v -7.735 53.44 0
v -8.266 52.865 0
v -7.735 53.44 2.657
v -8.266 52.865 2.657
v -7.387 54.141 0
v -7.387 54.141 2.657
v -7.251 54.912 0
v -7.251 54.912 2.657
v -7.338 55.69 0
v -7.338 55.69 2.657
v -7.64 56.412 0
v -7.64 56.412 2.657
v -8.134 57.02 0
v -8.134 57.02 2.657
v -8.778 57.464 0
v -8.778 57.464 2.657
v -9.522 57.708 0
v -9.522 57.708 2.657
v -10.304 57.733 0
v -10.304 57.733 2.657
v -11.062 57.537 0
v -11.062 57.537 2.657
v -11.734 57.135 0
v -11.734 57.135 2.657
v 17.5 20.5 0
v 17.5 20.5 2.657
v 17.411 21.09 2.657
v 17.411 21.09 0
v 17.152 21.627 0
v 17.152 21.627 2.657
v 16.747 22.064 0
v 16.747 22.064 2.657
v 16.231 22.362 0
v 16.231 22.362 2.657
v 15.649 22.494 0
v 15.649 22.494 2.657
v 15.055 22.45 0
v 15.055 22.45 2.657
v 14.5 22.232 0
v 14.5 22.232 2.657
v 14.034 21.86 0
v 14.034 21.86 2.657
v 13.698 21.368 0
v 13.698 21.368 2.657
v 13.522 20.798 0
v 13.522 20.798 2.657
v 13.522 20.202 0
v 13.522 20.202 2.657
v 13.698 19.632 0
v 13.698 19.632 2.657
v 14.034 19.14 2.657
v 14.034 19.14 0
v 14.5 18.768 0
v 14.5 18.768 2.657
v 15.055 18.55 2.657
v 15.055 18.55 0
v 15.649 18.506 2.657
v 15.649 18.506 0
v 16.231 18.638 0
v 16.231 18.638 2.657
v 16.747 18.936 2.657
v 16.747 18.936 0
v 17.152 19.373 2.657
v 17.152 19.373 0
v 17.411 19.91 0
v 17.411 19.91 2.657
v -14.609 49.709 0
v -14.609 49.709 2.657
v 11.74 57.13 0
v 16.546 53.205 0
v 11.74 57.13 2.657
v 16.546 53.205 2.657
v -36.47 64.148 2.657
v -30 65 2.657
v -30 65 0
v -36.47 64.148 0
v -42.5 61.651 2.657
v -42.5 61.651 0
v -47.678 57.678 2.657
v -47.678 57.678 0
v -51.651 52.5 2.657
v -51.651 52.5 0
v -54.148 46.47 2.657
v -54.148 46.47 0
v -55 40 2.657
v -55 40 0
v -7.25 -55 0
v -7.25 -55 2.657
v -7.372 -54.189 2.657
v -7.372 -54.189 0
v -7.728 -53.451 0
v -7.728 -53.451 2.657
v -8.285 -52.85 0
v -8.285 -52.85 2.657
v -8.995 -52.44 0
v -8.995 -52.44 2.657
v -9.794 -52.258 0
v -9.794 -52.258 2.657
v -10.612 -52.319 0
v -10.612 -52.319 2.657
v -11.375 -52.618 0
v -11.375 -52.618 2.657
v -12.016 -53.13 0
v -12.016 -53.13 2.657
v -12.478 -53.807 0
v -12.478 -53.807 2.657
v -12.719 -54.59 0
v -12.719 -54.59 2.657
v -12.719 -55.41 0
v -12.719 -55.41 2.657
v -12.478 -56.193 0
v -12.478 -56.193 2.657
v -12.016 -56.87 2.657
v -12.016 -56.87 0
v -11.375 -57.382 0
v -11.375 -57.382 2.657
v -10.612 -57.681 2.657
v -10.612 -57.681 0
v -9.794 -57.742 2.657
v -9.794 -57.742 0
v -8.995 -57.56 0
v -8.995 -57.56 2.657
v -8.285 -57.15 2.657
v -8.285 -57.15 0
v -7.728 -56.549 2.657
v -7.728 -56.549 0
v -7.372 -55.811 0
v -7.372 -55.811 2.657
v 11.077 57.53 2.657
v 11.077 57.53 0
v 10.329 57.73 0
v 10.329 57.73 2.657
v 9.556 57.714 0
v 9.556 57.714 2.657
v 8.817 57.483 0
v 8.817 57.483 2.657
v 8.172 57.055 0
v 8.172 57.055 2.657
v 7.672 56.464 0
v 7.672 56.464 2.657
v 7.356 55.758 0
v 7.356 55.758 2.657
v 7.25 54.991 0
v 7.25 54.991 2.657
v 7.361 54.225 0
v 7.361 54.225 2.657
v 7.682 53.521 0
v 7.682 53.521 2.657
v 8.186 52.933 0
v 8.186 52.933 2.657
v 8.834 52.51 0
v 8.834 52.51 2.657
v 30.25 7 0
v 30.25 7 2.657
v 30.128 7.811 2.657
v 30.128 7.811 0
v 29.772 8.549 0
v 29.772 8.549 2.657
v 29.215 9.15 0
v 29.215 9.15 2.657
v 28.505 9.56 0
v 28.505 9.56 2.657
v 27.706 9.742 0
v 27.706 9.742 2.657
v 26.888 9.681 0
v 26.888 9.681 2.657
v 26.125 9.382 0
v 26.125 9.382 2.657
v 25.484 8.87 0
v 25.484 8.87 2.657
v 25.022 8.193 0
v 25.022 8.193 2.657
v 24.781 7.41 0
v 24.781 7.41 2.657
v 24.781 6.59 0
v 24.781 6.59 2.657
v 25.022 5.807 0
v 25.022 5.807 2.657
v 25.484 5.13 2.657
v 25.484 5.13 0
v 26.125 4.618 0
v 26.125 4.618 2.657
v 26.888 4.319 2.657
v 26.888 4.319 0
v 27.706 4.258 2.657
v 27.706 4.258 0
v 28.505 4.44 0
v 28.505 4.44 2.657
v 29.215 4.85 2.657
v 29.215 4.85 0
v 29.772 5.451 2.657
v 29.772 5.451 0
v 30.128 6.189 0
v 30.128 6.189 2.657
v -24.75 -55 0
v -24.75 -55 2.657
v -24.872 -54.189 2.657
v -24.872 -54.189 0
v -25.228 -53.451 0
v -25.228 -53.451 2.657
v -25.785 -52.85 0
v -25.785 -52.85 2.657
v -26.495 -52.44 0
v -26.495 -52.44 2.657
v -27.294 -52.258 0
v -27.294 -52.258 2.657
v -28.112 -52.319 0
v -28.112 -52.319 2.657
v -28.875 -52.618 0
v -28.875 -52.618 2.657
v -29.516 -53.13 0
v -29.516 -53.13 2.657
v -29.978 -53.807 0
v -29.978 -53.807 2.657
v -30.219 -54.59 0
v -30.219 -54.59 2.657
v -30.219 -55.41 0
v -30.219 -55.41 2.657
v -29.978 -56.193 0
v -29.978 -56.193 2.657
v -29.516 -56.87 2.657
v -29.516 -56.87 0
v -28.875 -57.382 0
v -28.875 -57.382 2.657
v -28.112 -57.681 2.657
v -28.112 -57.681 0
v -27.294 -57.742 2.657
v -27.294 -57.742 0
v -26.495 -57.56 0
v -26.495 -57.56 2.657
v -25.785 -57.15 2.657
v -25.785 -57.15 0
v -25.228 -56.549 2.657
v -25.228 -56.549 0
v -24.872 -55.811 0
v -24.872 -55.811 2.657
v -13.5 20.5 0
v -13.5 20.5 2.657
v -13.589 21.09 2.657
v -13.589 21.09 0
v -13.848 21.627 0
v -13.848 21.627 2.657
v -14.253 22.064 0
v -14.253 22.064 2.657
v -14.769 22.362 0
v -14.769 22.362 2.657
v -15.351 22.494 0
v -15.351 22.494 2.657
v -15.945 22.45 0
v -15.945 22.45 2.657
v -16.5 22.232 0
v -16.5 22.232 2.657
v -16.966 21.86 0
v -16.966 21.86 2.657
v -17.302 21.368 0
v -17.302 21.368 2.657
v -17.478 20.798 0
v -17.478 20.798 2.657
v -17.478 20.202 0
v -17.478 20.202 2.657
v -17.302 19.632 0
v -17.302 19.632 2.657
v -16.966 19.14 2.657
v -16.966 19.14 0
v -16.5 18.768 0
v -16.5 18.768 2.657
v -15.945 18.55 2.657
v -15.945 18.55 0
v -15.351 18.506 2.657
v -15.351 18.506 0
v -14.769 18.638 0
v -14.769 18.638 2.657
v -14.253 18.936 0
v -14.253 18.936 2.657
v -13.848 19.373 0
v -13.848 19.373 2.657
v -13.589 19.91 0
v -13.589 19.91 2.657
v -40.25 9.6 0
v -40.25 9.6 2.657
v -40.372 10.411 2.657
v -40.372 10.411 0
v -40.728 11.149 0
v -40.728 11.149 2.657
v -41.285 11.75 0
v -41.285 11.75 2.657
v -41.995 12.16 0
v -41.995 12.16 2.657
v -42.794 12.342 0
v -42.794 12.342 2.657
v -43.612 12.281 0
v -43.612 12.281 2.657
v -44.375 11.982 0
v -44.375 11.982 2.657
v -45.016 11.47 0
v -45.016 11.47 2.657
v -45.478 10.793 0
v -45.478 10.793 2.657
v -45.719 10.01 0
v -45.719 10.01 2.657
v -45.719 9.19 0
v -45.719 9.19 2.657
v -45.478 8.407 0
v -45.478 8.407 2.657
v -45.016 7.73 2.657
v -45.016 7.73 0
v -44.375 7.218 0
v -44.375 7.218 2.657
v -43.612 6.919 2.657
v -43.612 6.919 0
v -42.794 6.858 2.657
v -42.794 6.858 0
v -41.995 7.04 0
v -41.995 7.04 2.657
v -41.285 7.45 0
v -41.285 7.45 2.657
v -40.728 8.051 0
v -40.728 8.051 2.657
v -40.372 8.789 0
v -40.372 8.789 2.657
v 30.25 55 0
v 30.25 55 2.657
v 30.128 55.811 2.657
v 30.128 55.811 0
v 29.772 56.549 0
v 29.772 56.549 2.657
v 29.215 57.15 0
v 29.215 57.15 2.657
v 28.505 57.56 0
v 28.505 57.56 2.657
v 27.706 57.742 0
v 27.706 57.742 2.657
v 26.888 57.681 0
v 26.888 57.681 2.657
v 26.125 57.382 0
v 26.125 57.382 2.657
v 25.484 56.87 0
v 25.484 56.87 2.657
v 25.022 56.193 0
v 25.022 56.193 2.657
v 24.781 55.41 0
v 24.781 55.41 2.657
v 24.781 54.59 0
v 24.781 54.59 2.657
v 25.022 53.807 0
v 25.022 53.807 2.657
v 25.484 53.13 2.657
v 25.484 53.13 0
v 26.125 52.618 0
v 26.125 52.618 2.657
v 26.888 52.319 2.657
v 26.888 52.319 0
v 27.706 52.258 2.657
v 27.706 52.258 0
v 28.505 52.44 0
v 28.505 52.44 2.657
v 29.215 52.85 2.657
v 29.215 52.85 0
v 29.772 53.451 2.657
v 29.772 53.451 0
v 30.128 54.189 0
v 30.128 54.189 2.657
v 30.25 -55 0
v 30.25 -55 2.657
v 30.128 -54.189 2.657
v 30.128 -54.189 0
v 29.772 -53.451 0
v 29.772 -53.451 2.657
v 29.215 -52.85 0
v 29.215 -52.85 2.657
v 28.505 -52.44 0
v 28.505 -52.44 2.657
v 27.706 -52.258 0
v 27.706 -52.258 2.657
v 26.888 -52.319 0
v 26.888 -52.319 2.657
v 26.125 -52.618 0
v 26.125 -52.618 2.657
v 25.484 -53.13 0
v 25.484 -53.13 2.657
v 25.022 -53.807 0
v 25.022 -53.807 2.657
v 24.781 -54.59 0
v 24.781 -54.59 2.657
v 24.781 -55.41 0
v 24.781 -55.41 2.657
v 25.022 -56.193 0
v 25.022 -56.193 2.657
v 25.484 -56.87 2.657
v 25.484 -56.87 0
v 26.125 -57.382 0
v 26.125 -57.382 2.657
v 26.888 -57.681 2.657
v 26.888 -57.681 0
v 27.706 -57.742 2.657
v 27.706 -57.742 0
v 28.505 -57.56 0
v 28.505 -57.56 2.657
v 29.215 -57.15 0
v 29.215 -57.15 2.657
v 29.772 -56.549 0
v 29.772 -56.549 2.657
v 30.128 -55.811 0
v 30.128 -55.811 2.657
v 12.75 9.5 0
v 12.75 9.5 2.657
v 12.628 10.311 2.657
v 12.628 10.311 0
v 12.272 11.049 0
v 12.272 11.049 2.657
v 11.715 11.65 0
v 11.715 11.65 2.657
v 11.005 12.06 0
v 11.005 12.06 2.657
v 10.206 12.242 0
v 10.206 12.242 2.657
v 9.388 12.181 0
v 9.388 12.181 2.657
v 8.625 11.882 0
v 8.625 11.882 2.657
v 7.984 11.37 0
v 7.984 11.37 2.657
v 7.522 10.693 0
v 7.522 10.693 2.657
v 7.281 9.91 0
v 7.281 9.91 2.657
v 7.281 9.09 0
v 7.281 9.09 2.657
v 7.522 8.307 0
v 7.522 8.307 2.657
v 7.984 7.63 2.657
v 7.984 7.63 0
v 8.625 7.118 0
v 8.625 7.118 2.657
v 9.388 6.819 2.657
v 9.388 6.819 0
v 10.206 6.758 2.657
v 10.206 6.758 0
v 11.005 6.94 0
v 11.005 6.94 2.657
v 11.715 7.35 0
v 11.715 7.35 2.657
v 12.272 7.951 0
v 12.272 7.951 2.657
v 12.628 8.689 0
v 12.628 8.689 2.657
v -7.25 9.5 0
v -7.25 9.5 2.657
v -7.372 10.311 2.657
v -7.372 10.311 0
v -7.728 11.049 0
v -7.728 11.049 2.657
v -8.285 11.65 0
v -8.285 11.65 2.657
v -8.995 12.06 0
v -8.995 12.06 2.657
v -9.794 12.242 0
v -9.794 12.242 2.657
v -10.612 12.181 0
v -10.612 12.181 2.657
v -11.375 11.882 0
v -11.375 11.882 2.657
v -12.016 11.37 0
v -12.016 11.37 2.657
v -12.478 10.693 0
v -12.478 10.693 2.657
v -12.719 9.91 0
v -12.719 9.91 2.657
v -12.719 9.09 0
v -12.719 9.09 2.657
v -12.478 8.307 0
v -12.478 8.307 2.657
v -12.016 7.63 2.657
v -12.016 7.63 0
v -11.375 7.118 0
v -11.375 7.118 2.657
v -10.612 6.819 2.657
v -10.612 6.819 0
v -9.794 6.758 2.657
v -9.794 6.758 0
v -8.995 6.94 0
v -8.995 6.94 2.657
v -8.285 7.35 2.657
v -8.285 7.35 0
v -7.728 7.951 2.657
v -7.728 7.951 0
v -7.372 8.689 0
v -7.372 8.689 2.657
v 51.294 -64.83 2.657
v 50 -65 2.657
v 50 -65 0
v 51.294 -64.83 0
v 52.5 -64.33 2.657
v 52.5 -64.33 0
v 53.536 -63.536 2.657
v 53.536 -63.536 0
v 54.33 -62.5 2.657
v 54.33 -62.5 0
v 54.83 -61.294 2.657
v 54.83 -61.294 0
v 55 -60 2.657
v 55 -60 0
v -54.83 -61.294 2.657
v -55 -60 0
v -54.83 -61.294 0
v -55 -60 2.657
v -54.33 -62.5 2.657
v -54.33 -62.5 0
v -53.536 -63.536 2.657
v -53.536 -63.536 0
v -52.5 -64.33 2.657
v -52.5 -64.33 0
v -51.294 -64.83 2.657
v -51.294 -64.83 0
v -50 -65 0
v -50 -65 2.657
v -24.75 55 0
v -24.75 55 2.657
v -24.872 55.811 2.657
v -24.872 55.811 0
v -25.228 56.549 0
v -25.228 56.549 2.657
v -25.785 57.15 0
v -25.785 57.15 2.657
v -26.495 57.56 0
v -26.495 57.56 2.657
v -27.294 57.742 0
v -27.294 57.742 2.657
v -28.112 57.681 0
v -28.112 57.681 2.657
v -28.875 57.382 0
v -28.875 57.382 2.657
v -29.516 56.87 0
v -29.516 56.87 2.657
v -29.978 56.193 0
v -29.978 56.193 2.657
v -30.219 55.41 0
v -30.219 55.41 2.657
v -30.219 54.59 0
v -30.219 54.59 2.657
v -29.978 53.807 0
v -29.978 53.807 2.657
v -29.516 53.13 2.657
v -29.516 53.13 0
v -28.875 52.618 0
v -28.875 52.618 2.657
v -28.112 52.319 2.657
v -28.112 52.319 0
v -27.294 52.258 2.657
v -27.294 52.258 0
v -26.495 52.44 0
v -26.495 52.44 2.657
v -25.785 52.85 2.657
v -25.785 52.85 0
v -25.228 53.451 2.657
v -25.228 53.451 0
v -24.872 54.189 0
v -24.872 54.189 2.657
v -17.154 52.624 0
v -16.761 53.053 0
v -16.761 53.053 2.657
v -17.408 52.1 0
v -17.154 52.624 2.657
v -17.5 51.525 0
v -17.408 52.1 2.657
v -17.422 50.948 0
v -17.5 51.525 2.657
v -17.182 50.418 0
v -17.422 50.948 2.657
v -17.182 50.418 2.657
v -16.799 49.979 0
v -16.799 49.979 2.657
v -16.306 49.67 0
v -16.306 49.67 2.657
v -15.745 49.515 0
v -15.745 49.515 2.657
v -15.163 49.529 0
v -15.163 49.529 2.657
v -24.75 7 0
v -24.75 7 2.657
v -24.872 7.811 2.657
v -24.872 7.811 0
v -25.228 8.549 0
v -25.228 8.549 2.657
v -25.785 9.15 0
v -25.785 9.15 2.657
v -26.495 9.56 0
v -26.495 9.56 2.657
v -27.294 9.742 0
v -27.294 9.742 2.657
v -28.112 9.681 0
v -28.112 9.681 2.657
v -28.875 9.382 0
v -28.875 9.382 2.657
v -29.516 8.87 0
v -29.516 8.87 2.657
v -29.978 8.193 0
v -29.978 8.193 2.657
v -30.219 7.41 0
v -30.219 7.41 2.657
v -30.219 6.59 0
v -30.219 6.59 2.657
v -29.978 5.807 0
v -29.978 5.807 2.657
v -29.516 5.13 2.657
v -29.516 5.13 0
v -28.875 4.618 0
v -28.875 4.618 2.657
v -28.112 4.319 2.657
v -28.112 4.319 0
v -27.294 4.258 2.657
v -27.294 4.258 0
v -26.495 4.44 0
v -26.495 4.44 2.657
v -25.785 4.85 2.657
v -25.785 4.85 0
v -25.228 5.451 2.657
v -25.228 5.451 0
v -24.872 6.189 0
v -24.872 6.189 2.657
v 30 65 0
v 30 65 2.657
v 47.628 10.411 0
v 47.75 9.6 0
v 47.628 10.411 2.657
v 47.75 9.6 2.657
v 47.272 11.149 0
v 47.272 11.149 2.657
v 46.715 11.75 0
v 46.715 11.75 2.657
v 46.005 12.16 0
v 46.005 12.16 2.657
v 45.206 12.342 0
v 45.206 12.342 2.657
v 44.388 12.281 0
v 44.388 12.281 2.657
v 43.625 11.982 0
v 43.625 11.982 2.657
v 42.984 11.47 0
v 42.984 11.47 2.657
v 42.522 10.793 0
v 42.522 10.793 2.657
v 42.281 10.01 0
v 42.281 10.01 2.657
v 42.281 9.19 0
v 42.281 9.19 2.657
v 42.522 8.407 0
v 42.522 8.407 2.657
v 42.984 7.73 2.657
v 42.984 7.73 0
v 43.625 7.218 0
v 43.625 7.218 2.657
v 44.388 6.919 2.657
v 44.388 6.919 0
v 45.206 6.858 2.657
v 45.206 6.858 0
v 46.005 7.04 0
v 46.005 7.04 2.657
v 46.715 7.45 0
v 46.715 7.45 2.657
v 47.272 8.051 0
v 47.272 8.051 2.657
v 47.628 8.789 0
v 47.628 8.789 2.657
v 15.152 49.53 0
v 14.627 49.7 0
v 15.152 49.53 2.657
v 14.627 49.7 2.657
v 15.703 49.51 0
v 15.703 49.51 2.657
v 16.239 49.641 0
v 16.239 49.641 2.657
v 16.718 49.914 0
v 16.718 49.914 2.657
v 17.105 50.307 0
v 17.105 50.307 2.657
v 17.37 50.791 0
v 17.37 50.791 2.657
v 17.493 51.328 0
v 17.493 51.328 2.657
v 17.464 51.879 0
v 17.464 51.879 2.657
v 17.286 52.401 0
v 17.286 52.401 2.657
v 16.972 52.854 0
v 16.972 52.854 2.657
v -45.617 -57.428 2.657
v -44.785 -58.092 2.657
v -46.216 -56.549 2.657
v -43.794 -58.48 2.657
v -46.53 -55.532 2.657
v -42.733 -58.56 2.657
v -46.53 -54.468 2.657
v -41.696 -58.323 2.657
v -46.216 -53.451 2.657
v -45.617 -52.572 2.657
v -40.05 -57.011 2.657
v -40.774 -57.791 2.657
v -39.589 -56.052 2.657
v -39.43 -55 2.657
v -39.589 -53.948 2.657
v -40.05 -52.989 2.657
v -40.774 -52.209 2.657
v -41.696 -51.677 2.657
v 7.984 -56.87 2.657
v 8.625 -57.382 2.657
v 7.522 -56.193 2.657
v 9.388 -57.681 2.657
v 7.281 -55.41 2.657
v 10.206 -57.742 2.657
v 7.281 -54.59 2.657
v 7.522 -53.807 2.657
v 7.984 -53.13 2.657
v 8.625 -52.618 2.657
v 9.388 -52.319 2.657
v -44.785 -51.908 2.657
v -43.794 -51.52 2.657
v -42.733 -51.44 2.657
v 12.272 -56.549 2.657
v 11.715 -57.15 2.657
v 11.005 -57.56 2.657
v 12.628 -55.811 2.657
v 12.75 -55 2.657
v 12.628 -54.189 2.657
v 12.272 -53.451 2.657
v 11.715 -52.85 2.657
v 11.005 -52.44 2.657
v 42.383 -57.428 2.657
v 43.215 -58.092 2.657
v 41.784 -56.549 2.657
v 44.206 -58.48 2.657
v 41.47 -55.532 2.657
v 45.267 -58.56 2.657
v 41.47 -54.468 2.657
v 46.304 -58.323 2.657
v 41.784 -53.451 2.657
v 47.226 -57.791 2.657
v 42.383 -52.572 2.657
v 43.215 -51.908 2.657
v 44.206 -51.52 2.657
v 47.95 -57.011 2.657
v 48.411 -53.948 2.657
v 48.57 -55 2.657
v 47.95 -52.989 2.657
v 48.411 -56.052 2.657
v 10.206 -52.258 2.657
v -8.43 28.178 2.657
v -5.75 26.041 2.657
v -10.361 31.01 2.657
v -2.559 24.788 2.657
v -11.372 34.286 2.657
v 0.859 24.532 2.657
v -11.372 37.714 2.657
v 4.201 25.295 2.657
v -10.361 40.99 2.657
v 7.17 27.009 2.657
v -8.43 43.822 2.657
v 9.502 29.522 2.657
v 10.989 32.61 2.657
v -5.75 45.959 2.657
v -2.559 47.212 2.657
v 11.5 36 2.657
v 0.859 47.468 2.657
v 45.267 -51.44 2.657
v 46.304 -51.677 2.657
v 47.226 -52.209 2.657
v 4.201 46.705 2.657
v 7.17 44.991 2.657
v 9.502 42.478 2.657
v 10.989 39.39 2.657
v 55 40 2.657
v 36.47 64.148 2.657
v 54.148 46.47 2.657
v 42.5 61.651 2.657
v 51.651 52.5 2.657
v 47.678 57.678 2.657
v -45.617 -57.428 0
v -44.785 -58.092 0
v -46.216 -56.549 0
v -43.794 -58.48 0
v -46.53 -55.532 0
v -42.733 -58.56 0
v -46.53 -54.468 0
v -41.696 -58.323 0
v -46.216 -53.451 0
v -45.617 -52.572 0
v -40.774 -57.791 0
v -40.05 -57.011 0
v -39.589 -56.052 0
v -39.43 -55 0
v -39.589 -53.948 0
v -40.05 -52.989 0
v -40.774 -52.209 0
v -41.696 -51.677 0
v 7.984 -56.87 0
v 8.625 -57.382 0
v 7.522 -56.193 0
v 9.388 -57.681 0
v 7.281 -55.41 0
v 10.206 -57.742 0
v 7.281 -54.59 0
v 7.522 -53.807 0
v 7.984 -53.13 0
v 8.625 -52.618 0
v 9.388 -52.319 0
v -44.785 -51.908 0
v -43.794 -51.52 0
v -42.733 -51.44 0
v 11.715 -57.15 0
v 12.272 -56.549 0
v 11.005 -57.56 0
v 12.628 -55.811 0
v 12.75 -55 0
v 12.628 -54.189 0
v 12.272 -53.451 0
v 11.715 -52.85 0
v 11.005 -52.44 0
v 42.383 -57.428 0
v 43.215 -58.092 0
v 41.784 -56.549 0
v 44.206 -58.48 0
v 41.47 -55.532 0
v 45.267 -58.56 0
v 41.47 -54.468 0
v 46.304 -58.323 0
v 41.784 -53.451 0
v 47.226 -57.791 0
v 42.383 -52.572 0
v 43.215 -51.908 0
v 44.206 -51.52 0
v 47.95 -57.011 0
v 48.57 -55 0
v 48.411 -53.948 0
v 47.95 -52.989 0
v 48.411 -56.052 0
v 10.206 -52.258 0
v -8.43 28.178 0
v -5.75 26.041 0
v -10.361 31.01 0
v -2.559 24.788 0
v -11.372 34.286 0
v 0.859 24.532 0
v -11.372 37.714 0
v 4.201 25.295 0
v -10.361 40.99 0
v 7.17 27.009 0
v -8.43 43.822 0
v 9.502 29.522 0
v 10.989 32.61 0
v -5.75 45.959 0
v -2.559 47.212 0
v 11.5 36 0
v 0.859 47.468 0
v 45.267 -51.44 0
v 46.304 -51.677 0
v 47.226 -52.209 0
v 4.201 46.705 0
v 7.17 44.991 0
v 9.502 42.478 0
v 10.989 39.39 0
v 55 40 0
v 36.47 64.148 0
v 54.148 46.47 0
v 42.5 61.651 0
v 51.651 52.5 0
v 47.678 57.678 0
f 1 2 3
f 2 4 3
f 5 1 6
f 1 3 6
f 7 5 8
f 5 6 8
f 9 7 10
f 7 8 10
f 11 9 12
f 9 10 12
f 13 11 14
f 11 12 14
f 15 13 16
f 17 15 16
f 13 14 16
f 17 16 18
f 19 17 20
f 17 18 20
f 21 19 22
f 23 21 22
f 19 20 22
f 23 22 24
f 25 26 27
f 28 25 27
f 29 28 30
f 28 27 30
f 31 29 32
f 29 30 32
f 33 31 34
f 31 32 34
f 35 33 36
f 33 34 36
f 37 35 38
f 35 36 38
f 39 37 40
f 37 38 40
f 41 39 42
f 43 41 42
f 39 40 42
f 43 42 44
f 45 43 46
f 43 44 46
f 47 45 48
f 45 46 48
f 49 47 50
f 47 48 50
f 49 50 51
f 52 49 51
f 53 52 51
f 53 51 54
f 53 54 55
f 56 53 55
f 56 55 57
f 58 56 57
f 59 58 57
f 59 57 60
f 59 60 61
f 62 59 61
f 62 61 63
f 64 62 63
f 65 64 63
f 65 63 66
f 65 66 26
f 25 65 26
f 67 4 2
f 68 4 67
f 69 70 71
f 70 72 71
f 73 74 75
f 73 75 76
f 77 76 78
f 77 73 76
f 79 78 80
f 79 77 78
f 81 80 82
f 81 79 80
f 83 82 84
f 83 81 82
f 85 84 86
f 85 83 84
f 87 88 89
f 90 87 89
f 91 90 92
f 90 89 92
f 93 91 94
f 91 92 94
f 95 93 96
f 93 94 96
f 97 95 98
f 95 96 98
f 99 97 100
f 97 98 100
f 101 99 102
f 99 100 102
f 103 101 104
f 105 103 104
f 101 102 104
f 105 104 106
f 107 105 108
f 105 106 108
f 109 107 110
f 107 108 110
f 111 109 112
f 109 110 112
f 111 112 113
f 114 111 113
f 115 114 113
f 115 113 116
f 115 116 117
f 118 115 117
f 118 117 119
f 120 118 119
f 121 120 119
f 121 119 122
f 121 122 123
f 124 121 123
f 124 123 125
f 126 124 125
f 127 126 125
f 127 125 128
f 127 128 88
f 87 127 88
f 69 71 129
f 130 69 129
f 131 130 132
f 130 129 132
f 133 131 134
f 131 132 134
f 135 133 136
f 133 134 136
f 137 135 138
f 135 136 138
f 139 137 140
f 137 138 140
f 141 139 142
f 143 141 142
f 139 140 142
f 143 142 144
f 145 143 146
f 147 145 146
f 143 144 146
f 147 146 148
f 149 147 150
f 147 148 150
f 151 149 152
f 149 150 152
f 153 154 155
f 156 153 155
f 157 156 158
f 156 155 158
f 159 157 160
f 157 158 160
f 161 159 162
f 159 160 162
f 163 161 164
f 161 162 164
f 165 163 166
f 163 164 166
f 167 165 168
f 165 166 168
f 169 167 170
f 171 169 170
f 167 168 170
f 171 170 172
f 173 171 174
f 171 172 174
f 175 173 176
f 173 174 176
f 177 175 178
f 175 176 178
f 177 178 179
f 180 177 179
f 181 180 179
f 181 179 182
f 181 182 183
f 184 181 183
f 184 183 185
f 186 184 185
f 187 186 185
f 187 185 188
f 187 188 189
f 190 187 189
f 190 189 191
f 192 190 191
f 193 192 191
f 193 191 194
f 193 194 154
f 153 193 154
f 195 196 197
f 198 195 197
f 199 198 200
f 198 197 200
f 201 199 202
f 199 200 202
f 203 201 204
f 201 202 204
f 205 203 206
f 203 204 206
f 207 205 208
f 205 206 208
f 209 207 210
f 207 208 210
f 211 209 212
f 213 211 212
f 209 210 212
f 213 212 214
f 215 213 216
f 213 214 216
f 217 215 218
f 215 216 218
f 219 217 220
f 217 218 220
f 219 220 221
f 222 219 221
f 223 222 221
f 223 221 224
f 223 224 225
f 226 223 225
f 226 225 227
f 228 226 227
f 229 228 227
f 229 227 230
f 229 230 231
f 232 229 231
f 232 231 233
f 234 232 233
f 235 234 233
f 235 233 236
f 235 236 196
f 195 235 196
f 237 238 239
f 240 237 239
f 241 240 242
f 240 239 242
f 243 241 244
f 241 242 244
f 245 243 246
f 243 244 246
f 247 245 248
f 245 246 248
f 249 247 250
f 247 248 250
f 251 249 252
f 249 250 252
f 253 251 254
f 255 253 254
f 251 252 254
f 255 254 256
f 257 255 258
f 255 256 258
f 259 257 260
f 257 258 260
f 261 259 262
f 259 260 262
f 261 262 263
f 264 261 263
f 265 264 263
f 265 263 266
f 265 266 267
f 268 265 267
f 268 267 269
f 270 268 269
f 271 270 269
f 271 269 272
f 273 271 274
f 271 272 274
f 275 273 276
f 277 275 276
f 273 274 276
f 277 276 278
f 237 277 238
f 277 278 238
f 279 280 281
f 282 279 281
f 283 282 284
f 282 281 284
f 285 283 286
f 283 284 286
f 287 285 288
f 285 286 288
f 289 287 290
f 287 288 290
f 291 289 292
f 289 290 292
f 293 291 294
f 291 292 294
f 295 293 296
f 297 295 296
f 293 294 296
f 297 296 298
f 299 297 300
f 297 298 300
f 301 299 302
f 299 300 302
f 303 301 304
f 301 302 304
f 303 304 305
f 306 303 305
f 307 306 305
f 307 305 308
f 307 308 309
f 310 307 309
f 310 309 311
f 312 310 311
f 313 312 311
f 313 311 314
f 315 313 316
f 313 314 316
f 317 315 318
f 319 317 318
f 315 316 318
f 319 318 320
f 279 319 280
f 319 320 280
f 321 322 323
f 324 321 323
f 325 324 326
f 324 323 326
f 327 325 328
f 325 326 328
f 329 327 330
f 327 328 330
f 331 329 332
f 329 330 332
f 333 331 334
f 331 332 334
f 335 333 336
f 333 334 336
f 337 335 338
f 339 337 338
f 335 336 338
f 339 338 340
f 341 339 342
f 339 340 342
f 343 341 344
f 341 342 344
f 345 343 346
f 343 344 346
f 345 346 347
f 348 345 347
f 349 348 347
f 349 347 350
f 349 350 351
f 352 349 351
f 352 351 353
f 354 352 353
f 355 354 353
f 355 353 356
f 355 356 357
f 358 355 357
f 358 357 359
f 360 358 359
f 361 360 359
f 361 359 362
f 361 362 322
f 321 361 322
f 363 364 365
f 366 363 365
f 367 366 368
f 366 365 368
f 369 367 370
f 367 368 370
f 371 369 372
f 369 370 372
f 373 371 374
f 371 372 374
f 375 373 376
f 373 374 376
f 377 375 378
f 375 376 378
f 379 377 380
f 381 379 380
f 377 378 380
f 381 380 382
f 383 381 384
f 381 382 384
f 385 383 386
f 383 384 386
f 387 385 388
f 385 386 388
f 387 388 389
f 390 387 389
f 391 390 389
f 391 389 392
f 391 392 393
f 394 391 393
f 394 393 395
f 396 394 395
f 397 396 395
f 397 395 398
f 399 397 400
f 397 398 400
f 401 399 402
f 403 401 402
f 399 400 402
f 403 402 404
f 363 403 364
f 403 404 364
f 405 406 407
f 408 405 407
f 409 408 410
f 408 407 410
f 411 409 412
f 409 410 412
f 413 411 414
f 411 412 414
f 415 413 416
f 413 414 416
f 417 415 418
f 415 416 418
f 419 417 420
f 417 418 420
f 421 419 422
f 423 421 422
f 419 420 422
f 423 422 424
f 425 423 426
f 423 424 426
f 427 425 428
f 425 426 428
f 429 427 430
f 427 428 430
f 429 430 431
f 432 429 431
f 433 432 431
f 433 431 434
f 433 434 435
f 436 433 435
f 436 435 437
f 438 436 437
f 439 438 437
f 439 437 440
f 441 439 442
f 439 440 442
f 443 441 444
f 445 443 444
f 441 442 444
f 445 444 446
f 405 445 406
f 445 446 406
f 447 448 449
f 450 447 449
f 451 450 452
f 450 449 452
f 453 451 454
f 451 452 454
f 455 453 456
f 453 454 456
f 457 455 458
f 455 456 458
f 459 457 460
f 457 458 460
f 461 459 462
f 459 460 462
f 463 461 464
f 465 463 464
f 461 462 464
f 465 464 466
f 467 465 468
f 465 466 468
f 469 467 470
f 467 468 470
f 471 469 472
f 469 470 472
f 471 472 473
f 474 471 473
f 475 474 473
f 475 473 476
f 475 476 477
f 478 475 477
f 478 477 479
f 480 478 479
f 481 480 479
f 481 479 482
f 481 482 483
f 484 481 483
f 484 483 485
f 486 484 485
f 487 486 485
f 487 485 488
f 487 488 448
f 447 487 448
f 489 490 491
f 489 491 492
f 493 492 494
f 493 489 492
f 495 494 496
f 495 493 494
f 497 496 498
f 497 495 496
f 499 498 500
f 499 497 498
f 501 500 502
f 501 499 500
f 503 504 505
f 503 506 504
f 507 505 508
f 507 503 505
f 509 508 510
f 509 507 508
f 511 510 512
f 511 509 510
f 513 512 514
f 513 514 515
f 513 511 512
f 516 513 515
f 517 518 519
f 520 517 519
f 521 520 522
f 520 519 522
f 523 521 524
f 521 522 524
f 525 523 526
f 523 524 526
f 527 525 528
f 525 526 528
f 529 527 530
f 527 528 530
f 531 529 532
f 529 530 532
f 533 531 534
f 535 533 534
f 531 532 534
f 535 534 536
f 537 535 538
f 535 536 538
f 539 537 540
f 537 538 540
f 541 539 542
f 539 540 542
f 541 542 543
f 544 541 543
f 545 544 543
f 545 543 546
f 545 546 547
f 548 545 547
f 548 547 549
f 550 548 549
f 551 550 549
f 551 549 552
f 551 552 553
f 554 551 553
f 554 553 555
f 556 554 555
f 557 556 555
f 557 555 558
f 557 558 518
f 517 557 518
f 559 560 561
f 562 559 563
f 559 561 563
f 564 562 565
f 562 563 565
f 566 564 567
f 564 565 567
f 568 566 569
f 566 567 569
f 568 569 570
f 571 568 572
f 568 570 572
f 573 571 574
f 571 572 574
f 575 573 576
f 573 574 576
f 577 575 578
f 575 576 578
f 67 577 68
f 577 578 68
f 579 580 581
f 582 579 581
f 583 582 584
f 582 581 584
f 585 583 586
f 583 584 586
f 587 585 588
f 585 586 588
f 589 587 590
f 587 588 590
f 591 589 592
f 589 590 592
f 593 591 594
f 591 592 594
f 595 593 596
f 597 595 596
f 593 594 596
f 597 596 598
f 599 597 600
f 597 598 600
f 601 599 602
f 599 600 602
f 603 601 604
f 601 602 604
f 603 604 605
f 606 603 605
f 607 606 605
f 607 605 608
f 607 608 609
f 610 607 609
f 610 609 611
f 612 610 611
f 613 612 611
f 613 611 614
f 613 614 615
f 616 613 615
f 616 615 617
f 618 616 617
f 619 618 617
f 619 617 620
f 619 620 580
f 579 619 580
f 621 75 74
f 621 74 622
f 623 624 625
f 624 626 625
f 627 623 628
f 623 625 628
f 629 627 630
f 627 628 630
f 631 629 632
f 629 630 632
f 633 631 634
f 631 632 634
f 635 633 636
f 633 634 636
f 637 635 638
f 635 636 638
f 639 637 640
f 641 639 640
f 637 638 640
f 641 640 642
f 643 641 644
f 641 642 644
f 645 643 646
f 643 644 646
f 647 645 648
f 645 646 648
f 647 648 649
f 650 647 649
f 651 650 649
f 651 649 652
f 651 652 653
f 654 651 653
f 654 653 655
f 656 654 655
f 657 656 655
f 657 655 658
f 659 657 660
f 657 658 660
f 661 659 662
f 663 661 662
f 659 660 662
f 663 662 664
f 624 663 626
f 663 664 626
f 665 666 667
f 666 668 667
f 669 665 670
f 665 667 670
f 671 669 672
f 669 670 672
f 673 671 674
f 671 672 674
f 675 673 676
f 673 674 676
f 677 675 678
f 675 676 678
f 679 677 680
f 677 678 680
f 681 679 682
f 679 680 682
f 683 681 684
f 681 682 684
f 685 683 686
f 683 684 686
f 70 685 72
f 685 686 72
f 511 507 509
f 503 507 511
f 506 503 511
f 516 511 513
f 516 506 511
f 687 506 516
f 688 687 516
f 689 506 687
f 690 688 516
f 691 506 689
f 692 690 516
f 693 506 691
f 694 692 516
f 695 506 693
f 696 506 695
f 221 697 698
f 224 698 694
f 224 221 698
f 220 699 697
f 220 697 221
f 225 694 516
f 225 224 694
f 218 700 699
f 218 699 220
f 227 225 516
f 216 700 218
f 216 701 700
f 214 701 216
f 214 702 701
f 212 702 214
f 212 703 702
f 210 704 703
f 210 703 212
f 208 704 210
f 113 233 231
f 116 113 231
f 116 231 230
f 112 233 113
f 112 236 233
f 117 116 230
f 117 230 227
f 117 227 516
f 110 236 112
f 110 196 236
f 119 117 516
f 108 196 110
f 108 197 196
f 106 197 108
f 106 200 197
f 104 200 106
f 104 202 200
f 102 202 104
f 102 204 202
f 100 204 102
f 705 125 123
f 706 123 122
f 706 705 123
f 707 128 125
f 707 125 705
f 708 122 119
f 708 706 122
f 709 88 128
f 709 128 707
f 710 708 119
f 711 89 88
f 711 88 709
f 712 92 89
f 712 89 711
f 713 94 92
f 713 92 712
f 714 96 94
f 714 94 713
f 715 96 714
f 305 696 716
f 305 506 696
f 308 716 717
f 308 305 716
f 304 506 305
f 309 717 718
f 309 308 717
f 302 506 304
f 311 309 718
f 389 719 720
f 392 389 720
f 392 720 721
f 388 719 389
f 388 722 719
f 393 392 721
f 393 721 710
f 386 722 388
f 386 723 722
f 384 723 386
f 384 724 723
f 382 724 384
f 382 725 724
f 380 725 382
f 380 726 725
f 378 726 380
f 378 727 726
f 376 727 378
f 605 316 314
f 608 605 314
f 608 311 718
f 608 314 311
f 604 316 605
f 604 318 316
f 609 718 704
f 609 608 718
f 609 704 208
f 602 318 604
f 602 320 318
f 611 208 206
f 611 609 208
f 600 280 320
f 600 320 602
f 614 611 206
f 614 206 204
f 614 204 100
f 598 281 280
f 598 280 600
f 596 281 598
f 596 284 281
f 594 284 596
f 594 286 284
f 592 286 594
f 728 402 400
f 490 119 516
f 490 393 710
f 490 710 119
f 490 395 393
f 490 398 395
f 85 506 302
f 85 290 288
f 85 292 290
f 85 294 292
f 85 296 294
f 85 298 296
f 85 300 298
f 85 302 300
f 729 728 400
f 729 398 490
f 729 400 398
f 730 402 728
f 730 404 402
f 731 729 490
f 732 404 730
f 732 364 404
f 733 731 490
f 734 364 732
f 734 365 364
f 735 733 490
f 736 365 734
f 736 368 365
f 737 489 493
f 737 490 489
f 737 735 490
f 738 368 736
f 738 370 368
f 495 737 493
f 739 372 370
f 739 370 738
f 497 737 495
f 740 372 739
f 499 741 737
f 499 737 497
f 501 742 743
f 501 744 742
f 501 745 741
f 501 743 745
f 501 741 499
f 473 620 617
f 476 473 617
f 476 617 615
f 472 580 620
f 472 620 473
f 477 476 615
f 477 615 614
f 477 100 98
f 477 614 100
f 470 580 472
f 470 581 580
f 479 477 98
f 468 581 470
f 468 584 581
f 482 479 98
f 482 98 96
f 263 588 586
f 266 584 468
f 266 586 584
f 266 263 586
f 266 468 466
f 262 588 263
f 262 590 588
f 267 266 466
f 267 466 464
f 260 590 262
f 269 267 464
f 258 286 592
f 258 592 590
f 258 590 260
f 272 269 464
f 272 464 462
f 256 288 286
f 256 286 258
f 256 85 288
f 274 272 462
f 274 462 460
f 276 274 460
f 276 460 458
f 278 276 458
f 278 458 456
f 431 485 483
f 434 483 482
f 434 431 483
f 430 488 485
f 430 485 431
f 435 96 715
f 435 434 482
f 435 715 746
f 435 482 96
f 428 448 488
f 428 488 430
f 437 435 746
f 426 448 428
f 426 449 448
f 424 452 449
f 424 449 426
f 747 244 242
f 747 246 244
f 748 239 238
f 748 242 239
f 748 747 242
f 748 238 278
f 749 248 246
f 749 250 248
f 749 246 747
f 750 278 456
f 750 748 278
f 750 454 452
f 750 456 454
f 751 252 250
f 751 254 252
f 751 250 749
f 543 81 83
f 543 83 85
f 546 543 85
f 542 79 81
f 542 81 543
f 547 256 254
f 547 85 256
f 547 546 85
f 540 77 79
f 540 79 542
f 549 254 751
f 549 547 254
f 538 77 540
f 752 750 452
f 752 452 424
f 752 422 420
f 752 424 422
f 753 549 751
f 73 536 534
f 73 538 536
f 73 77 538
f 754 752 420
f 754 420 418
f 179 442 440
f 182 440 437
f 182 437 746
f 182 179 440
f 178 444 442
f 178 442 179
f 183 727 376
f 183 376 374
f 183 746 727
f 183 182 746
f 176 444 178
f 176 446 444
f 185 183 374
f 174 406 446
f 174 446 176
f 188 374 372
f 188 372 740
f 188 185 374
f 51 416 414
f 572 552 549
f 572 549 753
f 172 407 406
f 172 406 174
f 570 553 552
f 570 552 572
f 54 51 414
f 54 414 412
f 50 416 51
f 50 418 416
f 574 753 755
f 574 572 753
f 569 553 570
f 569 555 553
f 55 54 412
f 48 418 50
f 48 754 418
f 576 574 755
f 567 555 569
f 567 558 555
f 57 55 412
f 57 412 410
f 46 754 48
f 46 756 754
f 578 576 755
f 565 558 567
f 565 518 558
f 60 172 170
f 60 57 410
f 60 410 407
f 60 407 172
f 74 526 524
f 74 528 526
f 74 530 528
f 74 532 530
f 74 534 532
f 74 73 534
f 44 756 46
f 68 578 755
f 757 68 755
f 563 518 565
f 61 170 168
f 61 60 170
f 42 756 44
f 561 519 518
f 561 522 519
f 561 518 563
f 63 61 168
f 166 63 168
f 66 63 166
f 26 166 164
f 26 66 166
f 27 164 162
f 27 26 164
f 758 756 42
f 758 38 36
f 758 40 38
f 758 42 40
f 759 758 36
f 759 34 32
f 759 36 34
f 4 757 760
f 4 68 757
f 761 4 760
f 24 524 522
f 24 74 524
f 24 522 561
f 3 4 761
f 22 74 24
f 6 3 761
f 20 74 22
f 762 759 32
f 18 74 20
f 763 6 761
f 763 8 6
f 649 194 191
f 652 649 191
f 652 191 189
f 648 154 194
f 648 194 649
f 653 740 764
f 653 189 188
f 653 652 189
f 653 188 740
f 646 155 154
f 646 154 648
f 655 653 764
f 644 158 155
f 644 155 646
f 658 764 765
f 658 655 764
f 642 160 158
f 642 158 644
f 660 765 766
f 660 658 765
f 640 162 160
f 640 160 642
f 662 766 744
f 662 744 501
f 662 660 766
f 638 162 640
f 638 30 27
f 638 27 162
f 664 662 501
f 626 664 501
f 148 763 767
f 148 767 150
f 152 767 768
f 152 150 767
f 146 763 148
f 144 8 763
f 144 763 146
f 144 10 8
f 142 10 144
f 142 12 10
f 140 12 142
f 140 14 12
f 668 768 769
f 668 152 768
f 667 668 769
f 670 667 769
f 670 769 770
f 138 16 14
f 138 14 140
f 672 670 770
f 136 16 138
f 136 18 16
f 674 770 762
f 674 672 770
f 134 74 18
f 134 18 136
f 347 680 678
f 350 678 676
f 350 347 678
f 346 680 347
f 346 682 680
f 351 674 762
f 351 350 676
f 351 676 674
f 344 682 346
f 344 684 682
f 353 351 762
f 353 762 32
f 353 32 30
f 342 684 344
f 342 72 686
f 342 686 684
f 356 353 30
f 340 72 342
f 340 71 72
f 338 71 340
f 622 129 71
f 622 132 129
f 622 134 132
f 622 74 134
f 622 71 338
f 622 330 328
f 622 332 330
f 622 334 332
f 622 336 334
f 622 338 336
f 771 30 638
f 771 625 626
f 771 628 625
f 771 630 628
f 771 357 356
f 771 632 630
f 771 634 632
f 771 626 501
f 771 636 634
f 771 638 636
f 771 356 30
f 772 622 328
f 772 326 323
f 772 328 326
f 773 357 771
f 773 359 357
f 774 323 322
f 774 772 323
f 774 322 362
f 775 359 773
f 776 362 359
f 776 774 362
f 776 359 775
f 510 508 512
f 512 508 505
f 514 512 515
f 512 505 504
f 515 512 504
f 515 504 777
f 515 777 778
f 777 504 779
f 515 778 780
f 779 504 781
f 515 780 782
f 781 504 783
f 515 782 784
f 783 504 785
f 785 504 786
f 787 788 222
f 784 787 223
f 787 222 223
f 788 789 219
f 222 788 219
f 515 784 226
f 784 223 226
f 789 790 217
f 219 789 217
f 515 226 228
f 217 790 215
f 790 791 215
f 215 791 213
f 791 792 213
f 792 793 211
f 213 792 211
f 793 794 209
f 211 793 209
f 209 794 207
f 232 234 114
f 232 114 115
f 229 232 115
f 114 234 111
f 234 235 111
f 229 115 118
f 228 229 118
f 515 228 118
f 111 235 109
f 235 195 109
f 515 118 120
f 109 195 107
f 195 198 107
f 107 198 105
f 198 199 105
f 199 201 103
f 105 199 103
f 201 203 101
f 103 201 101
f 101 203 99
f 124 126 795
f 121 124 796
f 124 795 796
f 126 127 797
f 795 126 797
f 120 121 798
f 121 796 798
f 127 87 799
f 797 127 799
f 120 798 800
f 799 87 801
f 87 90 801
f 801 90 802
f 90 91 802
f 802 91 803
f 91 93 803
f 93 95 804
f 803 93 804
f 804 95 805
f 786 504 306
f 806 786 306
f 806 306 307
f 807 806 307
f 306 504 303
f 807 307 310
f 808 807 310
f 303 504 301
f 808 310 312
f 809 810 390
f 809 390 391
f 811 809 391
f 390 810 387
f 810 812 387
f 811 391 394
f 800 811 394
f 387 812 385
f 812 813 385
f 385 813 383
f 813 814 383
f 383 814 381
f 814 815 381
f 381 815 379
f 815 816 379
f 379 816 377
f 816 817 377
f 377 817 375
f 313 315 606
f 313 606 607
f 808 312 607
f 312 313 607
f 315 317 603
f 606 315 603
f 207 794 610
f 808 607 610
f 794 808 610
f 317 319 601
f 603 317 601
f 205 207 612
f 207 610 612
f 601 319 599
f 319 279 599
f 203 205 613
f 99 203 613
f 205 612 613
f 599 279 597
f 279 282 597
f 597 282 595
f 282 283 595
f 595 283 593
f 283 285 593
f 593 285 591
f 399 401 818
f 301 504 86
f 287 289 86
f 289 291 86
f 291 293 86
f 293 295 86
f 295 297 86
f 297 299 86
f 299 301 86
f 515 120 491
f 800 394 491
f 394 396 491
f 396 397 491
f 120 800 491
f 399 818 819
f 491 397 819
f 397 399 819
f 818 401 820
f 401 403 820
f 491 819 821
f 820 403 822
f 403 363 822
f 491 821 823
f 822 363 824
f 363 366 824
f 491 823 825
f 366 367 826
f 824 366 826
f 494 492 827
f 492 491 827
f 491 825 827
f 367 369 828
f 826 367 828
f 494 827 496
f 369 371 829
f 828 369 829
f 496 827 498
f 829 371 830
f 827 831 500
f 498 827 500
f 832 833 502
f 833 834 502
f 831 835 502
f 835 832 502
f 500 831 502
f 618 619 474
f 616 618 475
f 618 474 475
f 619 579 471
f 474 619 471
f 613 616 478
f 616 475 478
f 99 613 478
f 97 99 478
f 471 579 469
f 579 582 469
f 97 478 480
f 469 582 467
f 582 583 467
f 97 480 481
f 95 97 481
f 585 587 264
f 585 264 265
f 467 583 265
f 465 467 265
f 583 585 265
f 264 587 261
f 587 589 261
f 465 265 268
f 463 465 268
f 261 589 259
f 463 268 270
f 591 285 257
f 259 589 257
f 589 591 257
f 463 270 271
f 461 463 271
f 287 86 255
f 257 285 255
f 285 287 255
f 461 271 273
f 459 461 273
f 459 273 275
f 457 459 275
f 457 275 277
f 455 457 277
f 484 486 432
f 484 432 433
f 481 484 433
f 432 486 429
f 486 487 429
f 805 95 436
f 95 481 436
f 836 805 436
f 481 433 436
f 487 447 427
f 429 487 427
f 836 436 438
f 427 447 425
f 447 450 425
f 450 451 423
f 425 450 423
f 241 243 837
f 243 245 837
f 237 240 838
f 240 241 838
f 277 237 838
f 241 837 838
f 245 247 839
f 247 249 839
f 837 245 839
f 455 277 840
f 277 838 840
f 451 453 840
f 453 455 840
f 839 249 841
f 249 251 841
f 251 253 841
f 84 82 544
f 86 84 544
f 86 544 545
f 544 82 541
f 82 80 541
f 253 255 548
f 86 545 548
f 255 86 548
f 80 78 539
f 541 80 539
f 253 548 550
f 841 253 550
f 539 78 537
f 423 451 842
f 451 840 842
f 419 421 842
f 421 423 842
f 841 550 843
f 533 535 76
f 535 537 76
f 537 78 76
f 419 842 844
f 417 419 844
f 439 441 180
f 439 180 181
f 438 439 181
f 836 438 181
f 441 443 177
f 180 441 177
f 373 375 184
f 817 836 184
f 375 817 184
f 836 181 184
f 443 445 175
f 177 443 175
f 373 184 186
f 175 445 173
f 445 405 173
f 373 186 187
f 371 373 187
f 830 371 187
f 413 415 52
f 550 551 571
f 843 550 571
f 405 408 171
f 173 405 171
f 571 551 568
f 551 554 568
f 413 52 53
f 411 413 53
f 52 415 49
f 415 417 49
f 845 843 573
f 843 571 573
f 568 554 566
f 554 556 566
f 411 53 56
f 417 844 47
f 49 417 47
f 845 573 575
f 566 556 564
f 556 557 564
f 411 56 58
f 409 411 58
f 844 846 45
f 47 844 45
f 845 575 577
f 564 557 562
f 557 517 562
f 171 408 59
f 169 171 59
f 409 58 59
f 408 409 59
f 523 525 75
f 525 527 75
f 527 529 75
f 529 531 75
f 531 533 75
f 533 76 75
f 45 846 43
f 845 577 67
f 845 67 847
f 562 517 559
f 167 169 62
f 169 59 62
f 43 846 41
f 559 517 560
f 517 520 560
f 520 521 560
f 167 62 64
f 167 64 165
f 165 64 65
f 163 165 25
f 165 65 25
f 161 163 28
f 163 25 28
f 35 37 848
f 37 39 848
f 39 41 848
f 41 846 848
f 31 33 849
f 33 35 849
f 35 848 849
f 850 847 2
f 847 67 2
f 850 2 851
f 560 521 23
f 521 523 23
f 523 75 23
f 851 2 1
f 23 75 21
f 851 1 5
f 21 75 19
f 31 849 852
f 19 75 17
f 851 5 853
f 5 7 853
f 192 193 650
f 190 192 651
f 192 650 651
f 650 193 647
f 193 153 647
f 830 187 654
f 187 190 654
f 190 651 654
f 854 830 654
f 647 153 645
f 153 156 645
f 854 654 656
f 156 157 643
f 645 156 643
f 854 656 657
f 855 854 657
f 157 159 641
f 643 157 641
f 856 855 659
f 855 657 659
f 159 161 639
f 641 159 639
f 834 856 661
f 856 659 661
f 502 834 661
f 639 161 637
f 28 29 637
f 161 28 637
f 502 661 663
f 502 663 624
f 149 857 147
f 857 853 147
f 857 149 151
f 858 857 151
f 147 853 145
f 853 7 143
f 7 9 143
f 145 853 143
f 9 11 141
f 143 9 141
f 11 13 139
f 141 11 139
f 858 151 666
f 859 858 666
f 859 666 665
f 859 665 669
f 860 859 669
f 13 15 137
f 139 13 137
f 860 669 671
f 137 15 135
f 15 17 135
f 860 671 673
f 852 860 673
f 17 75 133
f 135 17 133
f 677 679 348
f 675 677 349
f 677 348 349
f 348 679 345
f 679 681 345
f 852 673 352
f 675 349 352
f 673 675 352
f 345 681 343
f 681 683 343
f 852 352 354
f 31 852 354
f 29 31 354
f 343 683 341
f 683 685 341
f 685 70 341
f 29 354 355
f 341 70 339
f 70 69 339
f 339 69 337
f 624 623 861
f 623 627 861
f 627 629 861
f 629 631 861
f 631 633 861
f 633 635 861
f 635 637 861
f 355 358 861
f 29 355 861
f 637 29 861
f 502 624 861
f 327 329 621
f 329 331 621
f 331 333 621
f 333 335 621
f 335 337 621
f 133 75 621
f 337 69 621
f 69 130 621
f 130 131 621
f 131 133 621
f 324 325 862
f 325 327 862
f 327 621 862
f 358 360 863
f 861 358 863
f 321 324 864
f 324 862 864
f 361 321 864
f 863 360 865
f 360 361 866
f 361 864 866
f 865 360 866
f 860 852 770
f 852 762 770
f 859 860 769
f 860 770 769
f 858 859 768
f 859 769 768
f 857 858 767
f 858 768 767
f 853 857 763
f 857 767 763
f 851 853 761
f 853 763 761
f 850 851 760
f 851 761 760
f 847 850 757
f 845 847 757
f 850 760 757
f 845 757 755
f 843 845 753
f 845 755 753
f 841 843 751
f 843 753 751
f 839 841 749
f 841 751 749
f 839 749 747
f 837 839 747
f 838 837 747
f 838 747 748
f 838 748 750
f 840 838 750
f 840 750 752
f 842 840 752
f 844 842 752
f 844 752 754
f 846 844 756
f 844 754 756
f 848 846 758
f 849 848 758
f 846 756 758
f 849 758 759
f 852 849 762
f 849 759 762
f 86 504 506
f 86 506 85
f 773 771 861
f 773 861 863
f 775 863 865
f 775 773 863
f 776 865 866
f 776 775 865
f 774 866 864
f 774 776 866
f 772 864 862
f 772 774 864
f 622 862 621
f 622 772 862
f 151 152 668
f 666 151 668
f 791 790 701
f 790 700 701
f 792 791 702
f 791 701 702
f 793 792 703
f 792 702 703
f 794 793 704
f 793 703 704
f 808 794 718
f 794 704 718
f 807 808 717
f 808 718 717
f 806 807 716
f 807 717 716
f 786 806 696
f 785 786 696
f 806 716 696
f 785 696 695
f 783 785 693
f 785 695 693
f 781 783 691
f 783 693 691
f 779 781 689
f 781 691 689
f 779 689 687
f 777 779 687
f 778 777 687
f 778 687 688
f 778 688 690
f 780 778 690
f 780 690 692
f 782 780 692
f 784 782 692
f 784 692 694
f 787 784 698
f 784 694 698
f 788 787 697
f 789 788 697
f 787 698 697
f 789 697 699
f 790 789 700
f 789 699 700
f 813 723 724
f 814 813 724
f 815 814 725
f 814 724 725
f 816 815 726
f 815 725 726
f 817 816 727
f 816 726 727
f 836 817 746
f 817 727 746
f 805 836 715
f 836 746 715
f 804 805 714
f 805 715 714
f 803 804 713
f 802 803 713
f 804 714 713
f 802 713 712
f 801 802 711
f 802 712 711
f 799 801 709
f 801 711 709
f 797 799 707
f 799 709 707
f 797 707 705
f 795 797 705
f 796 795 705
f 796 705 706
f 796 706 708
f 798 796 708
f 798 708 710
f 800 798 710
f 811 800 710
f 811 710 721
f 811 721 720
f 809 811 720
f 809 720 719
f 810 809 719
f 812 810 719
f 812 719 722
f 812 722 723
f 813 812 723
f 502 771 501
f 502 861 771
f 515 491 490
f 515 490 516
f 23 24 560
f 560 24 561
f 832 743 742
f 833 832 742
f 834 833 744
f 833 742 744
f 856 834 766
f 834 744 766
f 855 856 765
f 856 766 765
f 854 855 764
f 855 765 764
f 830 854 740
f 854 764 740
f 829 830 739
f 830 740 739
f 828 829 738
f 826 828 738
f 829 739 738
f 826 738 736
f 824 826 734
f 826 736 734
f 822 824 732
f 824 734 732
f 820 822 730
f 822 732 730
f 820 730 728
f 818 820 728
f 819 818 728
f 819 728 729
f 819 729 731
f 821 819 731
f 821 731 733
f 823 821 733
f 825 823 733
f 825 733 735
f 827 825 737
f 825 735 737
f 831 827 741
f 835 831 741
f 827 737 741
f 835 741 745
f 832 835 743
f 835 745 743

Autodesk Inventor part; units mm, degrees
ref_plane "YZ Plane" through (0, 0, 0) normal (1, 0, 0) x (0, 1, 0)
ref_plane "XZ Plane" through (0, 0, 0) normal (0, 1, 0) x (-1, 0, 0)
ref_plane "XY Plane" through (0, 0, 0) normal (0, 0, 1) x (1, 0, 0)
sketch "Sketch1" plane through (0, 0, 0) normal (0, 0, 1) x (1, 0, 0)
  line L0 (-55, 65) -> (55, 65)
  line L1 (55, 65) -> (55, -65)
  line L2 (55, -65) -> (-55, -65)
  line L3 (-55, -65) -> (-55, 65)
  point P0 (0, 0)
  dimension "d0" = 110
  dimension "d1" = 130
  dimension "d2" = 65
  dimension "d3" = 55
extrude "profile" add sketch "Sketch1" along normal blind 2.6568
sketch "Sketch3" plane through (0, 0, 2.6568) normal (0, 0, 1) x (1, 0, 0)
  line L0 (-55, 65) -> (-55, -65) projected
  line L1 (-55, -65) -> (55, -65) projected
  circle A0 centre (-43, -55) radius 3.57
  circle A1 centre (-43, 9.6) radius 2.75
  circle A2 centre (-43, 9.6) radius 11.75 construction
  point P0 (0, 0)
  dimension "d15" = 7.14
  dimension "d16" = 5.5
  dimension "d17" = 64.6
  dimension "d18" = 10
  dimension "d19" = 12
  dimension "d21" = 12
extrude "Extrusion3" cut sketch "Sketch3" against normal through all
pattern_linear "Rectangular Pattern2" count 2 spacing 88 along (1, 0, 0) of "Extrusion3"
sketch "Sketch4" plane through (0, 0, 2.6568) normal (0, 0, 1) x (1, 0, 0)
  line L0 (55, 65) -> (-55, 65) projected
  line L1 (55, -65) -> (55, 65) projected
  circle A0 centre (0, 36) radius 11.5
  circle A1 centre (-15.5, 51.5) radius 2
  circle A2 centre (15.5, 51.5) radius 2
  circle A3 centre (-15.5, 20.5) radius 2
  circle A4 centre (15.5, 20.5) radius 2
  point P0 (0, 0)
  dimension "d27" = 23
  dimension "d28" = 29
  dimension "d29" = 4
  dimension "d30" = 15.5
  dimension "d31" = 15.5
  dimension "d36" = 55
  dimension "d51" = 31
  dimension "d54" = 31
extrude "nema17_mount" cut sketch "Sketch4" against normal through all
fillet "Fillet1" radius 25 2 edges at (55, 65, 1.3284) (-55, 65, 1.3284)
sketch "Sketch5" plane through (0, 0, 2.6568) normal (0, 0, 1) x (1, 0, 0)
  line L0 (-55, 65) -> (-55, -65) projected
  line L1 (-55, -65) -> (55, -65) projected
  circle A0 centre (-10, 9.5) radius 2.75
  line L2 (30, 65) -> (-30, 65) projected
  circle A1 centre (10, 9.5) radius 2.75
  point P0 (67.5, -65)
  point P1 (-72.5, 60)
  point P2 (-72.5, -60)
  point P3 (-67.5, -65)
  point P4 (0, 0)
  dimension "d41" = 5.5
  dimension "d42" = 74.5
  dimension "d43" = 45
  dimension "d59" = 20
extrude "idler_holes" cut sketch "Sketch5" against normal through all
sketch "Sketch7" plane through (0, 0, 2.6568) normal (0, 0, 1) x (1, 0, 0)
  circle A0 centre (-15.5, 51.5) radius 2 projected
  line L0 (-55, 40) -> (-55, -65) projected
  line L1 (30, 65) -> (-30, 65) projected
  arc A1 (-9.3427, 52.3297) -> (-11.7335, 57.1348) centre (-10, 55) ccw
  arc A2 (11.7395, 57.13) -> (8.8336, 52.5096) centre (10, 55) ccw
  line L2 (-11.7335, 57.1348) -> (-16.7607, 53.0526)
  line L3 (-8.2665, 52.8652) -> (-14.6091, 49.7094)
  circle A3 centre (15.5, 51.5) radius 2 projected
  line L4 (8.8336, 52.5096) -> (14.6274, 49.7004)
  line L5 (16.9616, 52.8652) -> (11.7395, 57.13)
  point P0 (0, 0)
  dimension "d70" = 5.5
  dimension "d71" = 5.5
  dimension "d72" = 10
  dimension "d73" = 10
  dimension "d74" = 20
  dimension "d75" = 45
extrude "Extrusion7" cut sketch "Sketch7" against normal through all contours A0 L2 A1 L3 | L5 A3 L4 A2 | L5 A3 picked at (16.0496, 50.6933)
sketch "Sketch8" plane through (0, 0, 2.6568) normal (0, 0, 1) x (1, 0, 0)
  line L0 (-55, 40) -> (-55, -65) projected
  line L1 (-55, -65) -> (55, -65) projected
  circle A0 centre (-10, -55) radius 2.75
  circle A1 centre (10, -55) radius 2.75
  point P0 (0, 0)
  dimension "d78" = 5.5
  dimension "d79" = 5.5
  dimension "d80" = 20
  dimension "d81" = 10
  dimension "d82" = 10
  dimension "d83" = 45
extrude "Extrusion8" cut sketch "Sketch8" against normal through all
sketch "Sketch9" plane through (0, 0, 2.6568) normal (0, 0, 1) x (1, 0, 0)
  line L0 (-55, 40) -> (-55, -65) projected
  line L1 (-55, -65) -> (55, -65) projected
  circle A0 centre (-27.5, 7) radius 2.75
  point P0 (0, 0)
  dimension "d86" = 5.5
  dimension "d87" = 27.5
  dimension "d88" = 72
extrude "Extrusion9" cut sketch "Sketch9" against normal through all
pattern_linear "Rectangular Pattern4" count 2 spacing 55 along (1, 0, 0) count 2 spacing 62 along (0, -1, 0) of "Extrusion9"
fillet "Fillet3" radius 5 2 edges at (55, -65, 1.3284) (-55, -65, 1.3284)
sketch "Sketch10" plane through (0, 0, 2.6568) normal (0, 0, 1) x (1, 0, 0)
  line L0 (30, 65) -> (-30, 65) projected
  line L1 (-55, 40) -> (-55, -60) projected
  circle A0 centre (-27.5, 55) radius 2.75
  circle A1 centre (27.5, 55) radius 2.75
  point P0 (0, 0)
  dimension "d98" = 5.5
  dimension "d99" = 5.5
  dimension "d100" = 27.5
  dimension "d101" = 82.5
  dimension "d102" = 10
  dimension "d103" = 10
extrude "Extrusion10" cut sketch "Sketch10" against normal through all
equation "\"d2\" = 0.5 * d1"
equation "\"d3\" = 0.5 * d0"
equation "\"d72\" = d73"
equation "\"d82\" = d81"
properties part number "x_motor_mount_v2" material "Steel, Mild"
